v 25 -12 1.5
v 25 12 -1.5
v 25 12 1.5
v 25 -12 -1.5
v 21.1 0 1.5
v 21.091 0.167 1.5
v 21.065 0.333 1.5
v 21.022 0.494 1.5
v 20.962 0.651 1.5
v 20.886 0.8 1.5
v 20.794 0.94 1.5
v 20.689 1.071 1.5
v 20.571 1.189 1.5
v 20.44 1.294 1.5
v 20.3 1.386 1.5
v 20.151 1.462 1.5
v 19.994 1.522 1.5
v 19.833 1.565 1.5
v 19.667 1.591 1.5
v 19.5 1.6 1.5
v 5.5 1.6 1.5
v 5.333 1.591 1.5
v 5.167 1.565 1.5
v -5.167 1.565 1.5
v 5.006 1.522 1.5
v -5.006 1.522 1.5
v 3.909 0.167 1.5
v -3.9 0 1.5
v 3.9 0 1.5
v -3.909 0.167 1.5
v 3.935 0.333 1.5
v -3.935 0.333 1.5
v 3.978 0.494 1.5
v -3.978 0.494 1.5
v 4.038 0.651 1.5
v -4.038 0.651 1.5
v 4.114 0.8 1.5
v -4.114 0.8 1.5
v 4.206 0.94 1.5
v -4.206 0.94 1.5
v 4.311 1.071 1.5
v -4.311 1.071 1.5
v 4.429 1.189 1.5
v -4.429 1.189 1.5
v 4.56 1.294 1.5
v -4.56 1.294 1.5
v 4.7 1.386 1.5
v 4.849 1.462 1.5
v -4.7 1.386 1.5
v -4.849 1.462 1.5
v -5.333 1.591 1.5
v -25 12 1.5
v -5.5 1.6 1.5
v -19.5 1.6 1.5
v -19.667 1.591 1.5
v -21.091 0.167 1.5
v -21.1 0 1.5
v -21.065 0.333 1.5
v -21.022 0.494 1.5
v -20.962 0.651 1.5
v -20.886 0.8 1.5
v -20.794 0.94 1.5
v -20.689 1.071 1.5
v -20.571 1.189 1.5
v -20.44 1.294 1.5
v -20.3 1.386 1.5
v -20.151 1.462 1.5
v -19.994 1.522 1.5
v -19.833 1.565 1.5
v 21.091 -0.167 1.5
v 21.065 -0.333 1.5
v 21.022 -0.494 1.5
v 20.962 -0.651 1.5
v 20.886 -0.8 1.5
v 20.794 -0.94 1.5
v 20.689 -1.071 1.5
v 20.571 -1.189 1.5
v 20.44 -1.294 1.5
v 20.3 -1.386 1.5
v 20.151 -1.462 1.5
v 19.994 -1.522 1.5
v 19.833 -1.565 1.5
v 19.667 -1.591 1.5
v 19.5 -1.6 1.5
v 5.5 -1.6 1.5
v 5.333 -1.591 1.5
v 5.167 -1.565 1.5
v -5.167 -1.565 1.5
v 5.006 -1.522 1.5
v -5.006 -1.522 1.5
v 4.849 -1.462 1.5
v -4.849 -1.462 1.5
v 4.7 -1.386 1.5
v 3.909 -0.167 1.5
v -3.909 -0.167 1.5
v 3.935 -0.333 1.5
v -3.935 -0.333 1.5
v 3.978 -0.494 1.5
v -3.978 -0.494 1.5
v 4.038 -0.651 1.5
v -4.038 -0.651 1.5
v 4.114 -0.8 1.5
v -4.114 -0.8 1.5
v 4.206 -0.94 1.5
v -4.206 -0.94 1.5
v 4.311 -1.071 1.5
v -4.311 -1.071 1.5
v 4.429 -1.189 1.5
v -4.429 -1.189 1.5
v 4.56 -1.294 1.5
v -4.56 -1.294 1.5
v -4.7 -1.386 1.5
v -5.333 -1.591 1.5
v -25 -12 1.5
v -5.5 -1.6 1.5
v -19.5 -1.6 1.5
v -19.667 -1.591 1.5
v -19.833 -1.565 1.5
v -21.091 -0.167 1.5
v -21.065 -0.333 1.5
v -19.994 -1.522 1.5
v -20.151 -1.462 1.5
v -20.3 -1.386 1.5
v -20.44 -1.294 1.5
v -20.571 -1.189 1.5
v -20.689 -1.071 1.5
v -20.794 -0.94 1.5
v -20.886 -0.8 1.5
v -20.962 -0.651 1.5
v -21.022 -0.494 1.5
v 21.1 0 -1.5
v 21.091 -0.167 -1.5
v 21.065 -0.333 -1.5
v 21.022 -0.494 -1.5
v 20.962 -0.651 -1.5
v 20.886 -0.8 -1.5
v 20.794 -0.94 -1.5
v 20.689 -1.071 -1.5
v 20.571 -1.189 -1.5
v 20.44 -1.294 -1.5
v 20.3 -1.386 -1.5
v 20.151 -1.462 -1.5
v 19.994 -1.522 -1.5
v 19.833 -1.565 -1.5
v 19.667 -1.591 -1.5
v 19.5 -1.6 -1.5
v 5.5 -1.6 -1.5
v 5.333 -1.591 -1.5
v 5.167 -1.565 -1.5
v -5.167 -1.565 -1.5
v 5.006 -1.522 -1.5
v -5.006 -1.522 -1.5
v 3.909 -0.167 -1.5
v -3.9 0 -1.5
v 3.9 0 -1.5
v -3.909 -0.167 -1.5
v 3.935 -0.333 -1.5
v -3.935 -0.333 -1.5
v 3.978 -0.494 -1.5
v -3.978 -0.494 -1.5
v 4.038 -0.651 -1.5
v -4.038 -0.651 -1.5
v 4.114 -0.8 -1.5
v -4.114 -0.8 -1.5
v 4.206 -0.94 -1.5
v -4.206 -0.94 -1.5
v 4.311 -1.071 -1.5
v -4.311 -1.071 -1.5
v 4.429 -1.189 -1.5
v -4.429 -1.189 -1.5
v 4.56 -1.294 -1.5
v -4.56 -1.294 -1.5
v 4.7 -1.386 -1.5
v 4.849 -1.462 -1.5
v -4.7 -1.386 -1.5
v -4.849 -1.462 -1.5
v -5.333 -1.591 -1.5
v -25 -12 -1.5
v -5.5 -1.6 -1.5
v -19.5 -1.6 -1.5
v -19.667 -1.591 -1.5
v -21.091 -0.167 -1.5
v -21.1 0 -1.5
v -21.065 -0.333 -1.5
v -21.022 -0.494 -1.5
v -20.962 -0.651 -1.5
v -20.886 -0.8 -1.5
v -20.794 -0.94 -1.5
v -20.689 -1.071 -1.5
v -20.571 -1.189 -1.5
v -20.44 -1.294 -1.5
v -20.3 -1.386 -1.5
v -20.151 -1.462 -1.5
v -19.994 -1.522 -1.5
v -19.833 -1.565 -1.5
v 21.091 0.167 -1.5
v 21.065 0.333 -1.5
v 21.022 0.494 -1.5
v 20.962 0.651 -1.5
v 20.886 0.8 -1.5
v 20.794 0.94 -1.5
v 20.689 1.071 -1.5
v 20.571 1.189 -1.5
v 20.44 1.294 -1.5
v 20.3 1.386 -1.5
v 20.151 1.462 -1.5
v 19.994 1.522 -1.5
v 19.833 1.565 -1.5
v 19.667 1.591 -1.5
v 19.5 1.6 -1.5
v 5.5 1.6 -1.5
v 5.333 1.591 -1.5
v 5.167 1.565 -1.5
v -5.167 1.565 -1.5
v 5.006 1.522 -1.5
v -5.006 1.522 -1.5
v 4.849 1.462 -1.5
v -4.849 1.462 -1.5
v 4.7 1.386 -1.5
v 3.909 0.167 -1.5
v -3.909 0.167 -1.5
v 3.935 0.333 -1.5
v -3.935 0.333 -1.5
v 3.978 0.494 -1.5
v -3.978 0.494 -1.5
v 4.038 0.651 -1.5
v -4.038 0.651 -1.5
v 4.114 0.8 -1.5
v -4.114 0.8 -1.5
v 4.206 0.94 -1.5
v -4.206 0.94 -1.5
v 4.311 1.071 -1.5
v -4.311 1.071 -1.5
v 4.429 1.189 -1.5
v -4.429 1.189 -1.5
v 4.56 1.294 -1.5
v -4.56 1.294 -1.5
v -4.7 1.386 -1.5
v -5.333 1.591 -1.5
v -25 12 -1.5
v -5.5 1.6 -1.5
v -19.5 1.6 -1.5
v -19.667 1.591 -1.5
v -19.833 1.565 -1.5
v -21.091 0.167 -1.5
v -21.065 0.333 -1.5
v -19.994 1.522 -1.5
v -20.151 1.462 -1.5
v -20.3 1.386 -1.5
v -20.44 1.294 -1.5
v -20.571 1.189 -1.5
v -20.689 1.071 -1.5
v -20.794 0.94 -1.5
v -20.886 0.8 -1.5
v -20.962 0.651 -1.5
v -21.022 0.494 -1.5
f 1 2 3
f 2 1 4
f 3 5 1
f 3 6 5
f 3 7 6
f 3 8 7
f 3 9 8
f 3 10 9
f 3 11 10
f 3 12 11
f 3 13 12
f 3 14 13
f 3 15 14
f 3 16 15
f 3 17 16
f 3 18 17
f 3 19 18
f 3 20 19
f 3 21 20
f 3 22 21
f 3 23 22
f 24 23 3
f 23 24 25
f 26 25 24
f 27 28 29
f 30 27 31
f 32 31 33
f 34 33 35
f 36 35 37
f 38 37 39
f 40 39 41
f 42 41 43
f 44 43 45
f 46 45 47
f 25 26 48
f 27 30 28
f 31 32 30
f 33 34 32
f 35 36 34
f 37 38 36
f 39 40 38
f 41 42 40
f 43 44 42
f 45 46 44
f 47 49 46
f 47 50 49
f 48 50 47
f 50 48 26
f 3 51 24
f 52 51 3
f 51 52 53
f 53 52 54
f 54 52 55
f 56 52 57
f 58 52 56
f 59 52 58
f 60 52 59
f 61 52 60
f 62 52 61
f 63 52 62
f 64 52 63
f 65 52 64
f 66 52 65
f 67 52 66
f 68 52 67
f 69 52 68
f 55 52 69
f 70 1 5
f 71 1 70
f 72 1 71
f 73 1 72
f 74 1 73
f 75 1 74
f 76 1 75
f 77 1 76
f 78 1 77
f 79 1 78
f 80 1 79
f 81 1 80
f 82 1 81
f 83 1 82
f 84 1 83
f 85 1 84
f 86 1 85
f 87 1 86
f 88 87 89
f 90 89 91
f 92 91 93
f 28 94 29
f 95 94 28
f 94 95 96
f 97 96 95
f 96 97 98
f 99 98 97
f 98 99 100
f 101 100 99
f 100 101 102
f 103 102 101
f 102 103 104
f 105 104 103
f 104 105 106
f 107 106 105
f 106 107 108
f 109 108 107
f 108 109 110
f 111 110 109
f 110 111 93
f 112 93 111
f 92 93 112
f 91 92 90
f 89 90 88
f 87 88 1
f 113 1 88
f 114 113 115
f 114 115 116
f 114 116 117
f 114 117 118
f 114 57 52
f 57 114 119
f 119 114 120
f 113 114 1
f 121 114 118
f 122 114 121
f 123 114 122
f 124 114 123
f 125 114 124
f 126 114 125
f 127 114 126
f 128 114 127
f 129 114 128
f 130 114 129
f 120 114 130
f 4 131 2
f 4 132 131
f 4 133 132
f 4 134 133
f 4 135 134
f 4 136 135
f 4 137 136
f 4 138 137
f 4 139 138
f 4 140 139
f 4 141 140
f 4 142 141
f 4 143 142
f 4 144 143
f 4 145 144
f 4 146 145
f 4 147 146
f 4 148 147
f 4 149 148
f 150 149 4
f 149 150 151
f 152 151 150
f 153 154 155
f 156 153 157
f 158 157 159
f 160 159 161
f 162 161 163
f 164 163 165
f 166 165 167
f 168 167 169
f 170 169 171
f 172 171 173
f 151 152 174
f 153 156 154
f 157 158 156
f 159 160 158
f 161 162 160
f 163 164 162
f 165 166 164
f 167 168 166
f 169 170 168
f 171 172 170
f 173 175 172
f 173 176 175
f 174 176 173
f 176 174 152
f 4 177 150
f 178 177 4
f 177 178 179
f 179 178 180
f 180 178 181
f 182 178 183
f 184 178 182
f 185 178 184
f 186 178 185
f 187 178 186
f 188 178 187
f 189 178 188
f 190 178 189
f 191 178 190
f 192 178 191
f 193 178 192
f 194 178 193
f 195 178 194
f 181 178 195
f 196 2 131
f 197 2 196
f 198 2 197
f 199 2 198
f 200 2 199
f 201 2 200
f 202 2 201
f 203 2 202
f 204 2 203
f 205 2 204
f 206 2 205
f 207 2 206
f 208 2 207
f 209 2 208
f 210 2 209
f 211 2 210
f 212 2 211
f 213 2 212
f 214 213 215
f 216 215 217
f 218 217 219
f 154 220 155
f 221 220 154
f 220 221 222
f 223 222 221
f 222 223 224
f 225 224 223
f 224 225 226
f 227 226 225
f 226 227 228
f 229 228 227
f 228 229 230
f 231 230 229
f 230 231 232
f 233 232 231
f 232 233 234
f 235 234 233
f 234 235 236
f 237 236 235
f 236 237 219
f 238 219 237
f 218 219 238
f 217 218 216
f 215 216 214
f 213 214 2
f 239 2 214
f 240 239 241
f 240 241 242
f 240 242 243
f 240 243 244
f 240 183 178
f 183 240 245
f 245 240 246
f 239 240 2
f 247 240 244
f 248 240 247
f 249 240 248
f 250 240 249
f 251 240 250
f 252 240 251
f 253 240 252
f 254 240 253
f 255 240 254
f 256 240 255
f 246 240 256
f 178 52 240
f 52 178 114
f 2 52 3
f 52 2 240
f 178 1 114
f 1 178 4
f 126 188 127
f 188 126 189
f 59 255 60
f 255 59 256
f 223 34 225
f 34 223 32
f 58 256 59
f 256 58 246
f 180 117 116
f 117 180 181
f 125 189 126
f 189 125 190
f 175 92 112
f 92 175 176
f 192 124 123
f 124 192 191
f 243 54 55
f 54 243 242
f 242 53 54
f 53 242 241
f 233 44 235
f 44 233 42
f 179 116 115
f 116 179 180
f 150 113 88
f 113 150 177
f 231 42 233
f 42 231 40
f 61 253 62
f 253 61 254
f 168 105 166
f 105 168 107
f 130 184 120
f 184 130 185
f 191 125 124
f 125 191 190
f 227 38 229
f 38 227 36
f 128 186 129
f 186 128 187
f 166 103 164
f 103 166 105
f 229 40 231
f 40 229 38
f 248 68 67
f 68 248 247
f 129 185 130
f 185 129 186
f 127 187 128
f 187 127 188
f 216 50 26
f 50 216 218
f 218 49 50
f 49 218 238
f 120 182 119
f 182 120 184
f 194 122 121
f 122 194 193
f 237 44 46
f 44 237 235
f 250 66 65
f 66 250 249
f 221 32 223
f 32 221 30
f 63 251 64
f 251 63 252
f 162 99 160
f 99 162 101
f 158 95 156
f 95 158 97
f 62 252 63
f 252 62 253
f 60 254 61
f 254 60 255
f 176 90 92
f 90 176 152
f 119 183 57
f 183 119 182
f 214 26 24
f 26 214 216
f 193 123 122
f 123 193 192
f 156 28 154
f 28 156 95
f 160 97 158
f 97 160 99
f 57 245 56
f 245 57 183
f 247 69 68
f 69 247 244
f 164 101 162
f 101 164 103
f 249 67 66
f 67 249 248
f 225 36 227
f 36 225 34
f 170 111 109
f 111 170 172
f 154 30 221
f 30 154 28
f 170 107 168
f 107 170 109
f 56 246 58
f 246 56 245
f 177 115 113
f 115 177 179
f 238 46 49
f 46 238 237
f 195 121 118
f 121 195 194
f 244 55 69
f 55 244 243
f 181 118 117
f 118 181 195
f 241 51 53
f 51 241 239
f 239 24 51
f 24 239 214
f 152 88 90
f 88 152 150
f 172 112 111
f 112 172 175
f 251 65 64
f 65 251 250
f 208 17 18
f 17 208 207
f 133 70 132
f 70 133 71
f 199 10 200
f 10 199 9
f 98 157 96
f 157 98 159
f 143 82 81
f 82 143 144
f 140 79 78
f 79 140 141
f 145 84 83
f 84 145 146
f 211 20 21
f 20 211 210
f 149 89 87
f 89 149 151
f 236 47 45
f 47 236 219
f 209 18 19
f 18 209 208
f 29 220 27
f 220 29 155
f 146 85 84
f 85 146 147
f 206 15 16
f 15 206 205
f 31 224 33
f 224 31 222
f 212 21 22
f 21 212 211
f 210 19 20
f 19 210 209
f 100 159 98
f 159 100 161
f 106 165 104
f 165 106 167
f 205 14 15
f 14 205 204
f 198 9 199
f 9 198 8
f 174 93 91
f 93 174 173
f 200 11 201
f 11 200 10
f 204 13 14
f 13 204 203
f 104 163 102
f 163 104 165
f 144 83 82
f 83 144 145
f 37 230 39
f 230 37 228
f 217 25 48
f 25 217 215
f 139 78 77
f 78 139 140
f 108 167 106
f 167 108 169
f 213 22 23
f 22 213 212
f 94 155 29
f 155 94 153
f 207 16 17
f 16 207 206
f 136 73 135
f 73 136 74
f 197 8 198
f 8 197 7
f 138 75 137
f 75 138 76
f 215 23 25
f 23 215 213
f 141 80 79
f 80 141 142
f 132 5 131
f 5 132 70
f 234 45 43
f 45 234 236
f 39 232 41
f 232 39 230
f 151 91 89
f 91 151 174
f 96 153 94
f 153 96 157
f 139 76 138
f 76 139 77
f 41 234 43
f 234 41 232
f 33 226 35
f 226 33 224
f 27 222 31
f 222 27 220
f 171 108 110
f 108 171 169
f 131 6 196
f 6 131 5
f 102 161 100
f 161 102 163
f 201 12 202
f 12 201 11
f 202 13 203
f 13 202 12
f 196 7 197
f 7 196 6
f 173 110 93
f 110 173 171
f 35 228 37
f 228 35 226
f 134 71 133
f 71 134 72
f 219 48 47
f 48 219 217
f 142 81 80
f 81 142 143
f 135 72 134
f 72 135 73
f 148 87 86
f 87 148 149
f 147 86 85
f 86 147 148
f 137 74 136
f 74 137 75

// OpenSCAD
// Limit-switch mounting plate.
$fn = 60;
eps = 0.02;
plate_l = 50;
plate_w = 24;
plate_t = 3;
slot_l = 14;
module slot(x) { hull() { translate([x-slot_l/2,0,-plate_t/2-eps]) cylinder(d=3.2,h=plate_t+2*eps); translate([x+slot_l/2,0,-plate_t/2-eps]) cylinder(d=3.2,h=plate_t+2*eps); } }
difference() { cube([plate_l,plate_w,plate_t],center=true); slot(-plate_l/4); slot(plate_l/4); }
